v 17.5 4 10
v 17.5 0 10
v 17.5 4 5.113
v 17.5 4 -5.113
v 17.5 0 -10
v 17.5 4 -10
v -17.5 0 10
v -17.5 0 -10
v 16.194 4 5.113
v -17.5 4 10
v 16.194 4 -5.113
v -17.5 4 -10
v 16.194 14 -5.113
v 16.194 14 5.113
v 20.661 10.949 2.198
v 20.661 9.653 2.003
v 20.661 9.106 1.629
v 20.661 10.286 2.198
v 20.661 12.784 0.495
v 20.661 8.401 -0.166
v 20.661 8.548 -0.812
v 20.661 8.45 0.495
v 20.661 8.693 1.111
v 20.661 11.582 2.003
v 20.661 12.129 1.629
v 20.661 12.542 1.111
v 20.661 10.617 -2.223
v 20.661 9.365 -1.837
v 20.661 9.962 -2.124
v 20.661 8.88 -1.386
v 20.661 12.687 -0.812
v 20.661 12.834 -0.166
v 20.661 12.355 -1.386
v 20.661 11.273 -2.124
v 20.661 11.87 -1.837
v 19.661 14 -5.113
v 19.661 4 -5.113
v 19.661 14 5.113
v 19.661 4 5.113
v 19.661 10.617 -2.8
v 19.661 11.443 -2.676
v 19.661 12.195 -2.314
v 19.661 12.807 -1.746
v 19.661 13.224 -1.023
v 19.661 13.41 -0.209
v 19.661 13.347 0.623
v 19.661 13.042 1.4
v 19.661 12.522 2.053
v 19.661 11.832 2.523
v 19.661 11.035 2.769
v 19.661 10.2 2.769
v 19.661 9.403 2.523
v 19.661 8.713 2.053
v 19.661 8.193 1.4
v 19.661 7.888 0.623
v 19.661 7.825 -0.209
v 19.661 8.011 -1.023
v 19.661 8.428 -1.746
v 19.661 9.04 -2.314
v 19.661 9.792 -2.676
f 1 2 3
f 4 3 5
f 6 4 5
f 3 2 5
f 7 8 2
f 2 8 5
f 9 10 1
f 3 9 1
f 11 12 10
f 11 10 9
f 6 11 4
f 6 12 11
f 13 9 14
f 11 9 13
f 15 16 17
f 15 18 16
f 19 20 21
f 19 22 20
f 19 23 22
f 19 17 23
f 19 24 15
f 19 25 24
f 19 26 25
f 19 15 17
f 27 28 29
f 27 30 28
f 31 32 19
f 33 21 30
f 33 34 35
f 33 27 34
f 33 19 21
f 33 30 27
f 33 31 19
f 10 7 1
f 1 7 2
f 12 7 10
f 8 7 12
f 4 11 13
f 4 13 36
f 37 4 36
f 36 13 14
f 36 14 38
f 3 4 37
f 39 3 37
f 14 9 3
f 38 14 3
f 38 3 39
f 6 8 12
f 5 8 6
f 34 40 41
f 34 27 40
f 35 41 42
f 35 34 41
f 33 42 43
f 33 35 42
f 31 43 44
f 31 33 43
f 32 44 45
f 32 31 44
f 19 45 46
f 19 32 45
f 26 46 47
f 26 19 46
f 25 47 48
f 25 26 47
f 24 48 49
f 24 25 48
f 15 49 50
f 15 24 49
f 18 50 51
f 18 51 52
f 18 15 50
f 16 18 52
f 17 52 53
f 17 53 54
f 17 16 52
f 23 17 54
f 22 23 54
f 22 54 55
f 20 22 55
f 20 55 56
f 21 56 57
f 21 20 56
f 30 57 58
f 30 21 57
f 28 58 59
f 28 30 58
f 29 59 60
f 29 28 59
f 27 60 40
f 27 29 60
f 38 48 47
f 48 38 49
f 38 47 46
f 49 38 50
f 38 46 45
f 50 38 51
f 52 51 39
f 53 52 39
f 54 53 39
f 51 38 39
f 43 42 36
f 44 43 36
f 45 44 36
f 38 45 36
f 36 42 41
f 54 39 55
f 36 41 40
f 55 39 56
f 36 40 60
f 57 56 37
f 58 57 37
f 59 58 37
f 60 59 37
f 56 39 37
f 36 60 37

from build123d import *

# Parameters (mm, degrees)
SKETCH1_W           = 35
SKETCH1_H           = 20
BOSS_EXTRUDE1_DEPTH = 4
SKETCH2_W           = 3.466821798
SKETCH2_H           = 10.225967746
BOSS_EXTRUDE2_DEPTH = 10
SKETCH3_R           = 2.80007344
BOSS_EXTRUDE3_DEPTH = 1
BOSS_EXTRUDE3_TAPER = 30


with BuildPart() as part:
    # Sketch1 → Boss-Extrude1 (new body)
    with BuildSketch(Plane(origin=(0, 0, 0), x_dir=(1, 0, 0), z_dir=(0, 1, 0))):
        Rectangle(SKETCH1_W, SKETCH1_H)
    extrude(amount=BOSS_EXTRUDE1_DEPTH)

    # Sketch2 → Boss-Extrude2 (add)
    with BuildSketch(Plane(origin=(0, 4, 0), x_dir=(1, 0, 0), z_dir=(0, 1, 0))):
        with Locations((17.927516635, 0)):
            Rectangle(SKETCH2_W, SKETCH2_H)
    extrude(amount=BOSS_EXTRUDE2_DEPTH)

    # Sketch3 → Boss-Extrude3 (add)
    with BuildSketch(Plane(origin=(19.660927534, 0, 0), x_dir=(0, 0, -1), z_dir=(1, 0, 0))):
        with Locations((0, 10.617493758)):
            Circle(SKETCH3_R)
    extrude(amount=BOSS_EXTRUDE3_DEPTH, taper=BOSS_EXTRUDE3_TAPER)


solid = part.part
